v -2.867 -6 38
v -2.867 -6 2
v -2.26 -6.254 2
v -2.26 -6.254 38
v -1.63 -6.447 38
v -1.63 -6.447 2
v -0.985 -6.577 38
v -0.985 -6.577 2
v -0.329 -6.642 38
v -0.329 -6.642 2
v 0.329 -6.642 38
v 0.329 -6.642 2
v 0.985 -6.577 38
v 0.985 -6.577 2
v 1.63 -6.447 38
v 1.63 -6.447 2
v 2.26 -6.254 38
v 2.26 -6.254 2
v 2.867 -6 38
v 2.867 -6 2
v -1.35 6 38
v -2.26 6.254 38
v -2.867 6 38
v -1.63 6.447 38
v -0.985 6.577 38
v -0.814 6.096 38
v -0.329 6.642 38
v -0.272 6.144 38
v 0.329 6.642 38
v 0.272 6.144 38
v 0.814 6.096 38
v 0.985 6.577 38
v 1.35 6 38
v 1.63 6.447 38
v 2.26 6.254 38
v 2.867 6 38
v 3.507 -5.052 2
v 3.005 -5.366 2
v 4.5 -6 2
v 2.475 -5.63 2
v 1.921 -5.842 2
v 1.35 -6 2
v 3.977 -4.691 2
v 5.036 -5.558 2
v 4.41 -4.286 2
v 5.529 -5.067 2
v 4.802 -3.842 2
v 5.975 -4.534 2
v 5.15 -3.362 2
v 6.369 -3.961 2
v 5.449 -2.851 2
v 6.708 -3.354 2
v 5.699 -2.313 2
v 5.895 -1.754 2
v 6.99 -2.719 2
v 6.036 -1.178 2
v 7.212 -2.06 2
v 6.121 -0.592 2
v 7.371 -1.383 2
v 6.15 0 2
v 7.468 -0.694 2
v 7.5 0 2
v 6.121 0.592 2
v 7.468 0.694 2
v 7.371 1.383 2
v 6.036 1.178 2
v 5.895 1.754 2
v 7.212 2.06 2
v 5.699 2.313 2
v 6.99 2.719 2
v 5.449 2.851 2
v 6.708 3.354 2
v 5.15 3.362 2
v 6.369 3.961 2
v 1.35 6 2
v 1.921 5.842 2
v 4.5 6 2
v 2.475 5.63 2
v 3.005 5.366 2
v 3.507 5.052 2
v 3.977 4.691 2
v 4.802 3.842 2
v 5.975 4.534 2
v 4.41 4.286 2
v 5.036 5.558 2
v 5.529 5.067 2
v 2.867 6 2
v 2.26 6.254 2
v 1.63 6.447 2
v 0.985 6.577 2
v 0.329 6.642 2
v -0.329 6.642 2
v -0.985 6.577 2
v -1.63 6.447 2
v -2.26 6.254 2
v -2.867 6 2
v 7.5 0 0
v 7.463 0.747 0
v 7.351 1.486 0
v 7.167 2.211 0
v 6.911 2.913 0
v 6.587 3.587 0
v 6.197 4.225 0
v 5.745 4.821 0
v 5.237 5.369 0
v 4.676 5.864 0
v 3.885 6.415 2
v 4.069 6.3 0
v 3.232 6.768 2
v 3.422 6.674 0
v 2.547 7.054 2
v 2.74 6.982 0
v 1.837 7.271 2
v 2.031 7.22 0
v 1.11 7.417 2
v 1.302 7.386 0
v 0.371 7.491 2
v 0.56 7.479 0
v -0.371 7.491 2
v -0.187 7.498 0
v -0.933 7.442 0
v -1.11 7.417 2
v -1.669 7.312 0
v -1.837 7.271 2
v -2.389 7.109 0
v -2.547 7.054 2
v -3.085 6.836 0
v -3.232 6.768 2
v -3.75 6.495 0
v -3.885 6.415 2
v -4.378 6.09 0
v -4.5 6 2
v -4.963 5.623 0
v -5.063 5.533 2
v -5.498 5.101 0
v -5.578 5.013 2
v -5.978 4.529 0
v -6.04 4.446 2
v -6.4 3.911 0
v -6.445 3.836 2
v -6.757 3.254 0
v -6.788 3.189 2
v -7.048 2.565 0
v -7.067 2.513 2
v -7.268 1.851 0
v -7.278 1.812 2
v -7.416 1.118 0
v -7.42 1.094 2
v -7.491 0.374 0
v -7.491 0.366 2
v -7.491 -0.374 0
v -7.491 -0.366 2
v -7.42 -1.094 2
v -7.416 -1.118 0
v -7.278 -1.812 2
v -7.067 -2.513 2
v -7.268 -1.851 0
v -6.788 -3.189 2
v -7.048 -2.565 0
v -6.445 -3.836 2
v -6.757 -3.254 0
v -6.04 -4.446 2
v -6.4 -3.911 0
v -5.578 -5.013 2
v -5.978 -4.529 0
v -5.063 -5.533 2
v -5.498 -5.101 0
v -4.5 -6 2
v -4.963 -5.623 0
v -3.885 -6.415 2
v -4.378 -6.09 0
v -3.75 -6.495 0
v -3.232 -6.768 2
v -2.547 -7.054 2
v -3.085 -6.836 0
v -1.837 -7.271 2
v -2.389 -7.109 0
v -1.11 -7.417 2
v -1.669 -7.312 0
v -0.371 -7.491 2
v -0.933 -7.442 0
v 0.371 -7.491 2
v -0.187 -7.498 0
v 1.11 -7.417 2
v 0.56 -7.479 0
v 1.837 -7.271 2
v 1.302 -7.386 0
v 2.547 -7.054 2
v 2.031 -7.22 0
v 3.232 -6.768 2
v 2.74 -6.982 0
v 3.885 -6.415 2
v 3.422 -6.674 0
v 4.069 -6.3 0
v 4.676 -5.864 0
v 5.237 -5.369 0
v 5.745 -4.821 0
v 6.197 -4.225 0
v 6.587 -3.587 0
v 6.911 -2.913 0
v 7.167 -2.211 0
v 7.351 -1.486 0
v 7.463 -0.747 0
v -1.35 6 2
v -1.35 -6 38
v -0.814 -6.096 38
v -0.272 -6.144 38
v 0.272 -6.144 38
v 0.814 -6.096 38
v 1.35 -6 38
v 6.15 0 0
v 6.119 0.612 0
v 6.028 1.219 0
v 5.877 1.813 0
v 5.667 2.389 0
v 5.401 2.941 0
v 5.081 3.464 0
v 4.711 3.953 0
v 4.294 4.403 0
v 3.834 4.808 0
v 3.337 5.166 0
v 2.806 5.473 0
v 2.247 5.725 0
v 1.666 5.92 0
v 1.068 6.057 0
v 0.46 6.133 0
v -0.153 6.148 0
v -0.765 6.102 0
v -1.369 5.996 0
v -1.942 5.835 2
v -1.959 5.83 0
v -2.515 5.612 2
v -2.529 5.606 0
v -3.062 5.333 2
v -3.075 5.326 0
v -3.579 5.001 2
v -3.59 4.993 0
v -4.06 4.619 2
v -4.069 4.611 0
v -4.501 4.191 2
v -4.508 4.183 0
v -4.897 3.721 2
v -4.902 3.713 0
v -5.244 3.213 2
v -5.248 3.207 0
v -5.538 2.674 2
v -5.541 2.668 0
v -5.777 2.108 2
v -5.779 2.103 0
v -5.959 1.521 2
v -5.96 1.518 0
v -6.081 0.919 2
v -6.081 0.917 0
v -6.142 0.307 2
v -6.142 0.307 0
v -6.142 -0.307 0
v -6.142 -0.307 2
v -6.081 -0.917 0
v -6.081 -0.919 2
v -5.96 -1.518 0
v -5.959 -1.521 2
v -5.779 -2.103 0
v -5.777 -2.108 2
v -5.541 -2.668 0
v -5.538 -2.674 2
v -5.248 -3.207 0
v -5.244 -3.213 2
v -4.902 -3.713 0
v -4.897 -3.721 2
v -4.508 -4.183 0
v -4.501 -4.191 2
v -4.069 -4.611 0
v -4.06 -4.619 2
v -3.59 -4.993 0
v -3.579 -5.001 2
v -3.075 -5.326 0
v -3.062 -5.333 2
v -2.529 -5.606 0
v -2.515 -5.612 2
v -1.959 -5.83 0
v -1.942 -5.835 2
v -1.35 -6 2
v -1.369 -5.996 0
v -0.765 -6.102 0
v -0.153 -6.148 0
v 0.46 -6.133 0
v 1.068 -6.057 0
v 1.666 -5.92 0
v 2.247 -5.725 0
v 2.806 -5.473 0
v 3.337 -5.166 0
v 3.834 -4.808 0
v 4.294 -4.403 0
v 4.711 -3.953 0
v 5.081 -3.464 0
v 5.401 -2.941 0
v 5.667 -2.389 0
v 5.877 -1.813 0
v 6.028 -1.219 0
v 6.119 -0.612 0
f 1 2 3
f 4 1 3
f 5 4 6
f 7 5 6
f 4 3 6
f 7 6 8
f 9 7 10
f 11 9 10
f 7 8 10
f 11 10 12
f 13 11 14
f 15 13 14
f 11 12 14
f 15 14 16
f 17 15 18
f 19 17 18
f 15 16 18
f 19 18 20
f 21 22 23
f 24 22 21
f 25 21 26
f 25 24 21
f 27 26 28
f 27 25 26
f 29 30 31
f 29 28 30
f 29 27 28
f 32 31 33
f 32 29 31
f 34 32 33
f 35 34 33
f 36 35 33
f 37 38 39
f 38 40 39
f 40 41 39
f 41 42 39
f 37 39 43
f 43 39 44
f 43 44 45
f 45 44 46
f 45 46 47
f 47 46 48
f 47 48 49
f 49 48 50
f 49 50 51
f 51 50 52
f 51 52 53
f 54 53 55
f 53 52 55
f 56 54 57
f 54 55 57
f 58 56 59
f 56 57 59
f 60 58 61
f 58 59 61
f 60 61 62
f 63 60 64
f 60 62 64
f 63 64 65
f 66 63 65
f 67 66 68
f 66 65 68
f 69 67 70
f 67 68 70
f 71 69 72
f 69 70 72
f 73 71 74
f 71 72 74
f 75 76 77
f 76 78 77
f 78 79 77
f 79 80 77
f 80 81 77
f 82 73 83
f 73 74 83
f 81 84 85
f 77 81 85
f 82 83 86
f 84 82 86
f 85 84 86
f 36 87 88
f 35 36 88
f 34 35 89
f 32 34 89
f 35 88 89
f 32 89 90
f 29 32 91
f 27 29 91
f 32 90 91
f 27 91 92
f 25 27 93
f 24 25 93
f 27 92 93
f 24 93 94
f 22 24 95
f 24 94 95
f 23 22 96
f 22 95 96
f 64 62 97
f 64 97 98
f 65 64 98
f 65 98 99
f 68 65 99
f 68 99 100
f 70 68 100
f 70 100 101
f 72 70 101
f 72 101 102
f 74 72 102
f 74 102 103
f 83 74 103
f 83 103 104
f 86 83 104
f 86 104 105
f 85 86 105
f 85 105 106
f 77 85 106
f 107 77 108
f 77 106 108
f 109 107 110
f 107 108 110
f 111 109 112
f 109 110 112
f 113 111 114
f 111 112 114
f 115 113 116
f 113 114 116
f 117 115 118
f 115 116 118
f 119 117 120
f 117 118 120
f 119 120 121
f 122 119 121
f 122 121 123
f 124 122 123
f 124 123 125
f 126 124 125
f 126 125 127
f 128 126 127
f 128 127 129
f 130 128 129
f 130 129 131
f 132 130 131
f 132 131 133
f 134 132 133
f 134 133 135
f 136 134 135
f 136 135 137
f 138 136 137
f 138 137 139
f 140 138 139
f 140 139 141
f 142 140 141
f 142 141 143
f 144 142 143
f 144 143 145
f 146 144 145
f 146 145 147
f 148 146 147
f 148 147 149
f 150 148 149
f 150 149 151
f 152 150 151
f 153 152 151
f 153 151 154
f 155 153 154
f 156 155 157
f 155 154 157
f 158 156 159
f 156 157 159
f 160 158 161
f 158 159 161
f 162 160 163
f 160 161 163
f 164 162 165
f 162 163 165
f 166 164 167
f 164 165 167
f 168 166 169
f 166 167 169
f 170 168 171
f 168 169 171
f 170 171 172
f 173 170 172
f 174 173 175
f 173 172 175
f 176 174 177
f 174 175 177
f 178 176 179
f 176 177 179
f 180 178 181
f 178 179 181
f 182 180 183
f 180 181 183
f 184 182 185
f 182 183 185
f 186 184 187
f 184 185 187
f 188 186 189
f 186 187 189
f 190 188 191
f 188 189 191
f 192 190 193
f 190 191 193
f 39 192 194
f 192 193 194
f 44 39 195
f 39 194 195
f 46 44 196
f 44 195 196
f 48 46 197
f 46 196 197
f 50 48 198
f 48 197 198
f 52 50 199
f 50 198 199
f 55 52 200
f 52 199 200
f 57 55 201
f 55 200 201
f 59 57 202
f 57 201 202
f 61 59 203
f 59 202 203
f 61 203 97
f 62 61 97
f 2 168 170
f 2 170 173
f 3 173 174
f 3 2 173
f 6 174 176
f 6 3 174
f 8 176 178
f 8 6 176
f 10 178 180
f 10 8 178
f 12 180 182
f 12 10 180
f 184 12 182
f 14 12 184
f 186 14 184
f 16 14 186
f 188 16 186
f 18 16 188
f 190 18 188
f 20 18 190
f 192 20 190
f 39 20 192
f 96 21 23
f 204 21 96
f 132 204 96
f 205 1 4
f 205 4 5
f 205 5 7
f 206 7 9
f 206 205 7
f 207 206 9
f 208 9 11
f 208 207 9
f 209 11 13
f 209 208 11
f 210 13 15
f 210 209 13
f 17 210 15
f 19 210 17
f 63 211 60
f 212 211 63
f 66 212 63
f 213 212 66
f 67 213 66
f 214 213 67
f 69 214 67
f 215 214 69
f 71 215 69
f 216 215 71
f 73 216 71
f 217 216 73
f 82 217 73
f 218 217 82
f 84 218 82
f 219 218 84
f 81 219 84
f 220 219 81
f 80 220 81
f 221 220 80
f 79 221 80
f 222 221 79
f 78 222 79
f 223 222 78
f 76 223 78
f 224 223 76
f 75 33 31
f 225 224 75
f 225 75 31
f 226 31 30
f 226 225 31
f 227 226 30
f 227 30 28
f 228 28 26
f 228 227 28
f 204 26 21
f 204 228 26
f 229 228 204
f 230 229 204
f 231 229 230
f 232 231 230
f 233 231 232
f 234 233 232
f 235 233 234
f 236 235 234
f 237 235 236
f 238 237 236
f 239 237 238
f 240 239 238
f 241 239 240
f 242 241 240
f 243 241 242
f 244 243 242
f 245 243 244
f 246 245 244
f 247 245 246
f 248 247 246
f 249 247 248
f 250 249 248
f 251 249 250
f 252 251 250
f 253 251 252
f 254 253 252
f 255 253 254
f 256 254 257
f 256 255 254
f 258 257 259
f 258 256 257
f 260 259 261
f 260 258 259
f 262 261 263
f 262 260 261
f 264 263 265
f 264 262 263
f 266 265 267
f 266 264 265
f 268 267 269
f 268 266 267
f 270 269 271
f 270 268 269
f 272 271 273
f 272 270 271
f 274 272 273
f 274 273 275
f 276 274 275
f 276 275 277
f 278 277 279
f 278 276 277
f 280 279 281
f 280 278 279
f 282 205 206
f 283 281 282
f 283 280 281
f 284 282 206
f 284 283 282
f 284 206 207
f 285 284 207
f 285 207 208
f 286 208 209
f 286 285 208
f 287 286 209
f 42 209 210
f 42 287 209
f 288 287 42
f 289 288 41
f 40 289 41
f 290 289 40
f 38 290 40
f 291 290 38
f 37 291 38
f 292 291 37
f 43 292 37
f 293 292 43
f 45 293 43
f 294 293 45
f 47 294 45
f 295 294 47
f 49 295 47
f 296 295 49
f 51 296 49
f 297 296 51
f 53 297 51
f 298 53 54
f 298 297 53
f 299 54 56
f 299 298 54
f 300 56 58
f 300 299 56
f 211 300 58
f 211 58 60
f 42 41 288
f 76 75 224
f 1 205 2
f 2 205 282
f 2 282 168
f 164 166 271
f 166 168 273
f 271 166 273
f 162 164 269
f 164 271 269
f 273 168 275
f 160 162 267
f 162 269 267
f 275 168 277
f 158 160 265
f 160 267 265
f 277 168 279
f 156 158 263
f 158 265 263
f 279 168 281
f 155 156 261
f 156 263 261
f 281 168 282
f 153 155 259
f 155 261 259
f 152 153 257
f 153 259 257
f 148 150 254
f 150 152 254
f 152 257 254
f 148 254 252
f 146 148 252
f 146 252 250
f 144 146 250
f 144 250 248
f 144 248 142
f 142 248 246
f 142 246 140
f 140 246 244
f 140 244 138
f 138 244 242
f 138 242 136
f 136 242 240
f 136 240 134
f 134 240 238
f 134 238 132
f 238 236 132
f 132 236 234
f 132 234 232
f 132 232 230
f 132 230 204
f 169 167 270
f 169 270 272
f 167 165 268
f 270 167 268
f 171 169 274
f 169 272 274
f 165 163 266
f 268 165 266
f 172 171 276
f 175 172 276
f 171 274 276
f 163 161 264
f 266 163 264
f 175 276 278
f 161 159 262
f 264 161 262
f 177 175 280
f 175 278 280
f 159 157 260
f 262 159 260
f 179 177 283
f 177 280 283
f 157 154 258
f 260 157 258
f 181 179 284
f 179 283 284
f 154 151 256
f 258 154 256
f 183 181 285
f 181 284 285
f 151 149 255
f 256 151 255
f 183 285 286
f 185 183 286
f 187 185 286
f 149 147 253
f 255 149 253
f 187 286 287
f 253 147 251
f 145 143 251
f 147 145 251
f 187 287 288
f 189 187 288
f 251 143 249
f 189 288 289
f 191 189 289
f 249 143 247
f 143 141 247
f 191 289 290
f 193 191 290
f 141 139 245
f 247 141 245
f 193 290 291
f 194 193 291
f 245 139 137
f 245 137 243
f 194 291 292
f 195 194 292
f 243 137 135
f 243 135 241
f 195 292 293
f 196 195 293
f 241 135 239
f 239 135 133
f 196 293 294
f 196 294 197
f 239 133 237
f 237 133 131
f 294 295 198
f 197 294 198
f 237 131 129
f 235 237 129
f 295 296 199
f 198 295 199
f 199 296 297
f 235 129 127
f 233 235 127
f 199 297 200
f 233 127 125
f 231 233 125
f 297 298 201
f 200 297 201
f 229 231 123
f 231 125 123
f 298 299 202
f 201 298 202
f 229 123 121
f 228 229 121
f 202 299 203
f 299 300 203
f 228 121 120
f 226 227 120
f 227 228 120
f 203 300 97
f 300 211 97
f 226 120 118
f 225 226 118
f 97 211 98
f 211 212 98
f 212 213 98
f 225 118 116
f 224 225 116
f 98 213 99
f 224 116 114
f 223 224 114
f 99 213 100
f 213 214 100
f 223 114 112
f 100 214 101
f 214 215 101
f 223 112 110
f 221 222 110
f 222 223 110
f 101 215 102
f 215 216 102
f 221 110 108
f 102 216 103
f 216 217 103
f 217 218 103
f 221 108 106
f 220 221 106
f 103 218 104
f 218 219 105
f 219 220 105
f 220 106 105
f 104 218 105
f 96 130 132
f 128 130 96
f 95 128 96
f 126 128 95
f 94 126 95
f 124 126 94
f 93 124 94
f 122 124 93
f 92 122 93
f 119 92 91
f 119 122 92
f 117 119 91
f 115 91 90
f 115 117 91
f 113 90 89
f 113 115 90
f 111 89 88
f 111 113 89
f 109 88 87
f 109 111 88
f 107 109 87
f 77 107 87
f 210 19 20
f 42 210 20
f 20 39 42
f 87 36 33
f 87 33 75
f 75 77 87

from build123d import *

# Parameters (mm, degrees)
SKETCH_R      = 7.5
SKETCH_R_2    = 6.15
PAD_DEPTH     = 2
SKETCH001_R   = 6.65
SKETCH001_R_2 = 6.15
PAD001_DEPTH  = 36
SKETCH002_W   = 42.259399
SKETCH002_H   = 12
POCKET_DEPTH  = 17.501


with BuildPart() as part:
    # Sketch → Pad (new body)
    with BuildSketch(Plane.XY):
        Circle(SKETCH_R)
        Circle(SKETCH_R_2, mode=Mode.SUBTRACT)
    extrude(amount=PAD_DEPTH)

    # Sketch001 (on Face4 of Pad) → Pad001 (join)
    with BuildSketch(Plane.XY.offset(2)):
        Circle(SKETCH001_R)
        Circle(SKETCH001_R_2, mode=Mode.SUBTRACT)
    extrude(amount=PAD001_DEPTH)

    # Sketch002 (on DatumPlane) → Pocket (cut, through all)
    with BuildSketch(Plane(origin=(10, 0, 0), x_dir=(0, 0, -1), z_dir=(1, 0, 0))):
        with Locations((-23.129699, 0)):
            Rectangle(SKETCH002_W, SKETCH002_H)
    extrude(amount=-POCKET_DEPTH, mode=Mode.SUBTRACT)


solid = part.part
